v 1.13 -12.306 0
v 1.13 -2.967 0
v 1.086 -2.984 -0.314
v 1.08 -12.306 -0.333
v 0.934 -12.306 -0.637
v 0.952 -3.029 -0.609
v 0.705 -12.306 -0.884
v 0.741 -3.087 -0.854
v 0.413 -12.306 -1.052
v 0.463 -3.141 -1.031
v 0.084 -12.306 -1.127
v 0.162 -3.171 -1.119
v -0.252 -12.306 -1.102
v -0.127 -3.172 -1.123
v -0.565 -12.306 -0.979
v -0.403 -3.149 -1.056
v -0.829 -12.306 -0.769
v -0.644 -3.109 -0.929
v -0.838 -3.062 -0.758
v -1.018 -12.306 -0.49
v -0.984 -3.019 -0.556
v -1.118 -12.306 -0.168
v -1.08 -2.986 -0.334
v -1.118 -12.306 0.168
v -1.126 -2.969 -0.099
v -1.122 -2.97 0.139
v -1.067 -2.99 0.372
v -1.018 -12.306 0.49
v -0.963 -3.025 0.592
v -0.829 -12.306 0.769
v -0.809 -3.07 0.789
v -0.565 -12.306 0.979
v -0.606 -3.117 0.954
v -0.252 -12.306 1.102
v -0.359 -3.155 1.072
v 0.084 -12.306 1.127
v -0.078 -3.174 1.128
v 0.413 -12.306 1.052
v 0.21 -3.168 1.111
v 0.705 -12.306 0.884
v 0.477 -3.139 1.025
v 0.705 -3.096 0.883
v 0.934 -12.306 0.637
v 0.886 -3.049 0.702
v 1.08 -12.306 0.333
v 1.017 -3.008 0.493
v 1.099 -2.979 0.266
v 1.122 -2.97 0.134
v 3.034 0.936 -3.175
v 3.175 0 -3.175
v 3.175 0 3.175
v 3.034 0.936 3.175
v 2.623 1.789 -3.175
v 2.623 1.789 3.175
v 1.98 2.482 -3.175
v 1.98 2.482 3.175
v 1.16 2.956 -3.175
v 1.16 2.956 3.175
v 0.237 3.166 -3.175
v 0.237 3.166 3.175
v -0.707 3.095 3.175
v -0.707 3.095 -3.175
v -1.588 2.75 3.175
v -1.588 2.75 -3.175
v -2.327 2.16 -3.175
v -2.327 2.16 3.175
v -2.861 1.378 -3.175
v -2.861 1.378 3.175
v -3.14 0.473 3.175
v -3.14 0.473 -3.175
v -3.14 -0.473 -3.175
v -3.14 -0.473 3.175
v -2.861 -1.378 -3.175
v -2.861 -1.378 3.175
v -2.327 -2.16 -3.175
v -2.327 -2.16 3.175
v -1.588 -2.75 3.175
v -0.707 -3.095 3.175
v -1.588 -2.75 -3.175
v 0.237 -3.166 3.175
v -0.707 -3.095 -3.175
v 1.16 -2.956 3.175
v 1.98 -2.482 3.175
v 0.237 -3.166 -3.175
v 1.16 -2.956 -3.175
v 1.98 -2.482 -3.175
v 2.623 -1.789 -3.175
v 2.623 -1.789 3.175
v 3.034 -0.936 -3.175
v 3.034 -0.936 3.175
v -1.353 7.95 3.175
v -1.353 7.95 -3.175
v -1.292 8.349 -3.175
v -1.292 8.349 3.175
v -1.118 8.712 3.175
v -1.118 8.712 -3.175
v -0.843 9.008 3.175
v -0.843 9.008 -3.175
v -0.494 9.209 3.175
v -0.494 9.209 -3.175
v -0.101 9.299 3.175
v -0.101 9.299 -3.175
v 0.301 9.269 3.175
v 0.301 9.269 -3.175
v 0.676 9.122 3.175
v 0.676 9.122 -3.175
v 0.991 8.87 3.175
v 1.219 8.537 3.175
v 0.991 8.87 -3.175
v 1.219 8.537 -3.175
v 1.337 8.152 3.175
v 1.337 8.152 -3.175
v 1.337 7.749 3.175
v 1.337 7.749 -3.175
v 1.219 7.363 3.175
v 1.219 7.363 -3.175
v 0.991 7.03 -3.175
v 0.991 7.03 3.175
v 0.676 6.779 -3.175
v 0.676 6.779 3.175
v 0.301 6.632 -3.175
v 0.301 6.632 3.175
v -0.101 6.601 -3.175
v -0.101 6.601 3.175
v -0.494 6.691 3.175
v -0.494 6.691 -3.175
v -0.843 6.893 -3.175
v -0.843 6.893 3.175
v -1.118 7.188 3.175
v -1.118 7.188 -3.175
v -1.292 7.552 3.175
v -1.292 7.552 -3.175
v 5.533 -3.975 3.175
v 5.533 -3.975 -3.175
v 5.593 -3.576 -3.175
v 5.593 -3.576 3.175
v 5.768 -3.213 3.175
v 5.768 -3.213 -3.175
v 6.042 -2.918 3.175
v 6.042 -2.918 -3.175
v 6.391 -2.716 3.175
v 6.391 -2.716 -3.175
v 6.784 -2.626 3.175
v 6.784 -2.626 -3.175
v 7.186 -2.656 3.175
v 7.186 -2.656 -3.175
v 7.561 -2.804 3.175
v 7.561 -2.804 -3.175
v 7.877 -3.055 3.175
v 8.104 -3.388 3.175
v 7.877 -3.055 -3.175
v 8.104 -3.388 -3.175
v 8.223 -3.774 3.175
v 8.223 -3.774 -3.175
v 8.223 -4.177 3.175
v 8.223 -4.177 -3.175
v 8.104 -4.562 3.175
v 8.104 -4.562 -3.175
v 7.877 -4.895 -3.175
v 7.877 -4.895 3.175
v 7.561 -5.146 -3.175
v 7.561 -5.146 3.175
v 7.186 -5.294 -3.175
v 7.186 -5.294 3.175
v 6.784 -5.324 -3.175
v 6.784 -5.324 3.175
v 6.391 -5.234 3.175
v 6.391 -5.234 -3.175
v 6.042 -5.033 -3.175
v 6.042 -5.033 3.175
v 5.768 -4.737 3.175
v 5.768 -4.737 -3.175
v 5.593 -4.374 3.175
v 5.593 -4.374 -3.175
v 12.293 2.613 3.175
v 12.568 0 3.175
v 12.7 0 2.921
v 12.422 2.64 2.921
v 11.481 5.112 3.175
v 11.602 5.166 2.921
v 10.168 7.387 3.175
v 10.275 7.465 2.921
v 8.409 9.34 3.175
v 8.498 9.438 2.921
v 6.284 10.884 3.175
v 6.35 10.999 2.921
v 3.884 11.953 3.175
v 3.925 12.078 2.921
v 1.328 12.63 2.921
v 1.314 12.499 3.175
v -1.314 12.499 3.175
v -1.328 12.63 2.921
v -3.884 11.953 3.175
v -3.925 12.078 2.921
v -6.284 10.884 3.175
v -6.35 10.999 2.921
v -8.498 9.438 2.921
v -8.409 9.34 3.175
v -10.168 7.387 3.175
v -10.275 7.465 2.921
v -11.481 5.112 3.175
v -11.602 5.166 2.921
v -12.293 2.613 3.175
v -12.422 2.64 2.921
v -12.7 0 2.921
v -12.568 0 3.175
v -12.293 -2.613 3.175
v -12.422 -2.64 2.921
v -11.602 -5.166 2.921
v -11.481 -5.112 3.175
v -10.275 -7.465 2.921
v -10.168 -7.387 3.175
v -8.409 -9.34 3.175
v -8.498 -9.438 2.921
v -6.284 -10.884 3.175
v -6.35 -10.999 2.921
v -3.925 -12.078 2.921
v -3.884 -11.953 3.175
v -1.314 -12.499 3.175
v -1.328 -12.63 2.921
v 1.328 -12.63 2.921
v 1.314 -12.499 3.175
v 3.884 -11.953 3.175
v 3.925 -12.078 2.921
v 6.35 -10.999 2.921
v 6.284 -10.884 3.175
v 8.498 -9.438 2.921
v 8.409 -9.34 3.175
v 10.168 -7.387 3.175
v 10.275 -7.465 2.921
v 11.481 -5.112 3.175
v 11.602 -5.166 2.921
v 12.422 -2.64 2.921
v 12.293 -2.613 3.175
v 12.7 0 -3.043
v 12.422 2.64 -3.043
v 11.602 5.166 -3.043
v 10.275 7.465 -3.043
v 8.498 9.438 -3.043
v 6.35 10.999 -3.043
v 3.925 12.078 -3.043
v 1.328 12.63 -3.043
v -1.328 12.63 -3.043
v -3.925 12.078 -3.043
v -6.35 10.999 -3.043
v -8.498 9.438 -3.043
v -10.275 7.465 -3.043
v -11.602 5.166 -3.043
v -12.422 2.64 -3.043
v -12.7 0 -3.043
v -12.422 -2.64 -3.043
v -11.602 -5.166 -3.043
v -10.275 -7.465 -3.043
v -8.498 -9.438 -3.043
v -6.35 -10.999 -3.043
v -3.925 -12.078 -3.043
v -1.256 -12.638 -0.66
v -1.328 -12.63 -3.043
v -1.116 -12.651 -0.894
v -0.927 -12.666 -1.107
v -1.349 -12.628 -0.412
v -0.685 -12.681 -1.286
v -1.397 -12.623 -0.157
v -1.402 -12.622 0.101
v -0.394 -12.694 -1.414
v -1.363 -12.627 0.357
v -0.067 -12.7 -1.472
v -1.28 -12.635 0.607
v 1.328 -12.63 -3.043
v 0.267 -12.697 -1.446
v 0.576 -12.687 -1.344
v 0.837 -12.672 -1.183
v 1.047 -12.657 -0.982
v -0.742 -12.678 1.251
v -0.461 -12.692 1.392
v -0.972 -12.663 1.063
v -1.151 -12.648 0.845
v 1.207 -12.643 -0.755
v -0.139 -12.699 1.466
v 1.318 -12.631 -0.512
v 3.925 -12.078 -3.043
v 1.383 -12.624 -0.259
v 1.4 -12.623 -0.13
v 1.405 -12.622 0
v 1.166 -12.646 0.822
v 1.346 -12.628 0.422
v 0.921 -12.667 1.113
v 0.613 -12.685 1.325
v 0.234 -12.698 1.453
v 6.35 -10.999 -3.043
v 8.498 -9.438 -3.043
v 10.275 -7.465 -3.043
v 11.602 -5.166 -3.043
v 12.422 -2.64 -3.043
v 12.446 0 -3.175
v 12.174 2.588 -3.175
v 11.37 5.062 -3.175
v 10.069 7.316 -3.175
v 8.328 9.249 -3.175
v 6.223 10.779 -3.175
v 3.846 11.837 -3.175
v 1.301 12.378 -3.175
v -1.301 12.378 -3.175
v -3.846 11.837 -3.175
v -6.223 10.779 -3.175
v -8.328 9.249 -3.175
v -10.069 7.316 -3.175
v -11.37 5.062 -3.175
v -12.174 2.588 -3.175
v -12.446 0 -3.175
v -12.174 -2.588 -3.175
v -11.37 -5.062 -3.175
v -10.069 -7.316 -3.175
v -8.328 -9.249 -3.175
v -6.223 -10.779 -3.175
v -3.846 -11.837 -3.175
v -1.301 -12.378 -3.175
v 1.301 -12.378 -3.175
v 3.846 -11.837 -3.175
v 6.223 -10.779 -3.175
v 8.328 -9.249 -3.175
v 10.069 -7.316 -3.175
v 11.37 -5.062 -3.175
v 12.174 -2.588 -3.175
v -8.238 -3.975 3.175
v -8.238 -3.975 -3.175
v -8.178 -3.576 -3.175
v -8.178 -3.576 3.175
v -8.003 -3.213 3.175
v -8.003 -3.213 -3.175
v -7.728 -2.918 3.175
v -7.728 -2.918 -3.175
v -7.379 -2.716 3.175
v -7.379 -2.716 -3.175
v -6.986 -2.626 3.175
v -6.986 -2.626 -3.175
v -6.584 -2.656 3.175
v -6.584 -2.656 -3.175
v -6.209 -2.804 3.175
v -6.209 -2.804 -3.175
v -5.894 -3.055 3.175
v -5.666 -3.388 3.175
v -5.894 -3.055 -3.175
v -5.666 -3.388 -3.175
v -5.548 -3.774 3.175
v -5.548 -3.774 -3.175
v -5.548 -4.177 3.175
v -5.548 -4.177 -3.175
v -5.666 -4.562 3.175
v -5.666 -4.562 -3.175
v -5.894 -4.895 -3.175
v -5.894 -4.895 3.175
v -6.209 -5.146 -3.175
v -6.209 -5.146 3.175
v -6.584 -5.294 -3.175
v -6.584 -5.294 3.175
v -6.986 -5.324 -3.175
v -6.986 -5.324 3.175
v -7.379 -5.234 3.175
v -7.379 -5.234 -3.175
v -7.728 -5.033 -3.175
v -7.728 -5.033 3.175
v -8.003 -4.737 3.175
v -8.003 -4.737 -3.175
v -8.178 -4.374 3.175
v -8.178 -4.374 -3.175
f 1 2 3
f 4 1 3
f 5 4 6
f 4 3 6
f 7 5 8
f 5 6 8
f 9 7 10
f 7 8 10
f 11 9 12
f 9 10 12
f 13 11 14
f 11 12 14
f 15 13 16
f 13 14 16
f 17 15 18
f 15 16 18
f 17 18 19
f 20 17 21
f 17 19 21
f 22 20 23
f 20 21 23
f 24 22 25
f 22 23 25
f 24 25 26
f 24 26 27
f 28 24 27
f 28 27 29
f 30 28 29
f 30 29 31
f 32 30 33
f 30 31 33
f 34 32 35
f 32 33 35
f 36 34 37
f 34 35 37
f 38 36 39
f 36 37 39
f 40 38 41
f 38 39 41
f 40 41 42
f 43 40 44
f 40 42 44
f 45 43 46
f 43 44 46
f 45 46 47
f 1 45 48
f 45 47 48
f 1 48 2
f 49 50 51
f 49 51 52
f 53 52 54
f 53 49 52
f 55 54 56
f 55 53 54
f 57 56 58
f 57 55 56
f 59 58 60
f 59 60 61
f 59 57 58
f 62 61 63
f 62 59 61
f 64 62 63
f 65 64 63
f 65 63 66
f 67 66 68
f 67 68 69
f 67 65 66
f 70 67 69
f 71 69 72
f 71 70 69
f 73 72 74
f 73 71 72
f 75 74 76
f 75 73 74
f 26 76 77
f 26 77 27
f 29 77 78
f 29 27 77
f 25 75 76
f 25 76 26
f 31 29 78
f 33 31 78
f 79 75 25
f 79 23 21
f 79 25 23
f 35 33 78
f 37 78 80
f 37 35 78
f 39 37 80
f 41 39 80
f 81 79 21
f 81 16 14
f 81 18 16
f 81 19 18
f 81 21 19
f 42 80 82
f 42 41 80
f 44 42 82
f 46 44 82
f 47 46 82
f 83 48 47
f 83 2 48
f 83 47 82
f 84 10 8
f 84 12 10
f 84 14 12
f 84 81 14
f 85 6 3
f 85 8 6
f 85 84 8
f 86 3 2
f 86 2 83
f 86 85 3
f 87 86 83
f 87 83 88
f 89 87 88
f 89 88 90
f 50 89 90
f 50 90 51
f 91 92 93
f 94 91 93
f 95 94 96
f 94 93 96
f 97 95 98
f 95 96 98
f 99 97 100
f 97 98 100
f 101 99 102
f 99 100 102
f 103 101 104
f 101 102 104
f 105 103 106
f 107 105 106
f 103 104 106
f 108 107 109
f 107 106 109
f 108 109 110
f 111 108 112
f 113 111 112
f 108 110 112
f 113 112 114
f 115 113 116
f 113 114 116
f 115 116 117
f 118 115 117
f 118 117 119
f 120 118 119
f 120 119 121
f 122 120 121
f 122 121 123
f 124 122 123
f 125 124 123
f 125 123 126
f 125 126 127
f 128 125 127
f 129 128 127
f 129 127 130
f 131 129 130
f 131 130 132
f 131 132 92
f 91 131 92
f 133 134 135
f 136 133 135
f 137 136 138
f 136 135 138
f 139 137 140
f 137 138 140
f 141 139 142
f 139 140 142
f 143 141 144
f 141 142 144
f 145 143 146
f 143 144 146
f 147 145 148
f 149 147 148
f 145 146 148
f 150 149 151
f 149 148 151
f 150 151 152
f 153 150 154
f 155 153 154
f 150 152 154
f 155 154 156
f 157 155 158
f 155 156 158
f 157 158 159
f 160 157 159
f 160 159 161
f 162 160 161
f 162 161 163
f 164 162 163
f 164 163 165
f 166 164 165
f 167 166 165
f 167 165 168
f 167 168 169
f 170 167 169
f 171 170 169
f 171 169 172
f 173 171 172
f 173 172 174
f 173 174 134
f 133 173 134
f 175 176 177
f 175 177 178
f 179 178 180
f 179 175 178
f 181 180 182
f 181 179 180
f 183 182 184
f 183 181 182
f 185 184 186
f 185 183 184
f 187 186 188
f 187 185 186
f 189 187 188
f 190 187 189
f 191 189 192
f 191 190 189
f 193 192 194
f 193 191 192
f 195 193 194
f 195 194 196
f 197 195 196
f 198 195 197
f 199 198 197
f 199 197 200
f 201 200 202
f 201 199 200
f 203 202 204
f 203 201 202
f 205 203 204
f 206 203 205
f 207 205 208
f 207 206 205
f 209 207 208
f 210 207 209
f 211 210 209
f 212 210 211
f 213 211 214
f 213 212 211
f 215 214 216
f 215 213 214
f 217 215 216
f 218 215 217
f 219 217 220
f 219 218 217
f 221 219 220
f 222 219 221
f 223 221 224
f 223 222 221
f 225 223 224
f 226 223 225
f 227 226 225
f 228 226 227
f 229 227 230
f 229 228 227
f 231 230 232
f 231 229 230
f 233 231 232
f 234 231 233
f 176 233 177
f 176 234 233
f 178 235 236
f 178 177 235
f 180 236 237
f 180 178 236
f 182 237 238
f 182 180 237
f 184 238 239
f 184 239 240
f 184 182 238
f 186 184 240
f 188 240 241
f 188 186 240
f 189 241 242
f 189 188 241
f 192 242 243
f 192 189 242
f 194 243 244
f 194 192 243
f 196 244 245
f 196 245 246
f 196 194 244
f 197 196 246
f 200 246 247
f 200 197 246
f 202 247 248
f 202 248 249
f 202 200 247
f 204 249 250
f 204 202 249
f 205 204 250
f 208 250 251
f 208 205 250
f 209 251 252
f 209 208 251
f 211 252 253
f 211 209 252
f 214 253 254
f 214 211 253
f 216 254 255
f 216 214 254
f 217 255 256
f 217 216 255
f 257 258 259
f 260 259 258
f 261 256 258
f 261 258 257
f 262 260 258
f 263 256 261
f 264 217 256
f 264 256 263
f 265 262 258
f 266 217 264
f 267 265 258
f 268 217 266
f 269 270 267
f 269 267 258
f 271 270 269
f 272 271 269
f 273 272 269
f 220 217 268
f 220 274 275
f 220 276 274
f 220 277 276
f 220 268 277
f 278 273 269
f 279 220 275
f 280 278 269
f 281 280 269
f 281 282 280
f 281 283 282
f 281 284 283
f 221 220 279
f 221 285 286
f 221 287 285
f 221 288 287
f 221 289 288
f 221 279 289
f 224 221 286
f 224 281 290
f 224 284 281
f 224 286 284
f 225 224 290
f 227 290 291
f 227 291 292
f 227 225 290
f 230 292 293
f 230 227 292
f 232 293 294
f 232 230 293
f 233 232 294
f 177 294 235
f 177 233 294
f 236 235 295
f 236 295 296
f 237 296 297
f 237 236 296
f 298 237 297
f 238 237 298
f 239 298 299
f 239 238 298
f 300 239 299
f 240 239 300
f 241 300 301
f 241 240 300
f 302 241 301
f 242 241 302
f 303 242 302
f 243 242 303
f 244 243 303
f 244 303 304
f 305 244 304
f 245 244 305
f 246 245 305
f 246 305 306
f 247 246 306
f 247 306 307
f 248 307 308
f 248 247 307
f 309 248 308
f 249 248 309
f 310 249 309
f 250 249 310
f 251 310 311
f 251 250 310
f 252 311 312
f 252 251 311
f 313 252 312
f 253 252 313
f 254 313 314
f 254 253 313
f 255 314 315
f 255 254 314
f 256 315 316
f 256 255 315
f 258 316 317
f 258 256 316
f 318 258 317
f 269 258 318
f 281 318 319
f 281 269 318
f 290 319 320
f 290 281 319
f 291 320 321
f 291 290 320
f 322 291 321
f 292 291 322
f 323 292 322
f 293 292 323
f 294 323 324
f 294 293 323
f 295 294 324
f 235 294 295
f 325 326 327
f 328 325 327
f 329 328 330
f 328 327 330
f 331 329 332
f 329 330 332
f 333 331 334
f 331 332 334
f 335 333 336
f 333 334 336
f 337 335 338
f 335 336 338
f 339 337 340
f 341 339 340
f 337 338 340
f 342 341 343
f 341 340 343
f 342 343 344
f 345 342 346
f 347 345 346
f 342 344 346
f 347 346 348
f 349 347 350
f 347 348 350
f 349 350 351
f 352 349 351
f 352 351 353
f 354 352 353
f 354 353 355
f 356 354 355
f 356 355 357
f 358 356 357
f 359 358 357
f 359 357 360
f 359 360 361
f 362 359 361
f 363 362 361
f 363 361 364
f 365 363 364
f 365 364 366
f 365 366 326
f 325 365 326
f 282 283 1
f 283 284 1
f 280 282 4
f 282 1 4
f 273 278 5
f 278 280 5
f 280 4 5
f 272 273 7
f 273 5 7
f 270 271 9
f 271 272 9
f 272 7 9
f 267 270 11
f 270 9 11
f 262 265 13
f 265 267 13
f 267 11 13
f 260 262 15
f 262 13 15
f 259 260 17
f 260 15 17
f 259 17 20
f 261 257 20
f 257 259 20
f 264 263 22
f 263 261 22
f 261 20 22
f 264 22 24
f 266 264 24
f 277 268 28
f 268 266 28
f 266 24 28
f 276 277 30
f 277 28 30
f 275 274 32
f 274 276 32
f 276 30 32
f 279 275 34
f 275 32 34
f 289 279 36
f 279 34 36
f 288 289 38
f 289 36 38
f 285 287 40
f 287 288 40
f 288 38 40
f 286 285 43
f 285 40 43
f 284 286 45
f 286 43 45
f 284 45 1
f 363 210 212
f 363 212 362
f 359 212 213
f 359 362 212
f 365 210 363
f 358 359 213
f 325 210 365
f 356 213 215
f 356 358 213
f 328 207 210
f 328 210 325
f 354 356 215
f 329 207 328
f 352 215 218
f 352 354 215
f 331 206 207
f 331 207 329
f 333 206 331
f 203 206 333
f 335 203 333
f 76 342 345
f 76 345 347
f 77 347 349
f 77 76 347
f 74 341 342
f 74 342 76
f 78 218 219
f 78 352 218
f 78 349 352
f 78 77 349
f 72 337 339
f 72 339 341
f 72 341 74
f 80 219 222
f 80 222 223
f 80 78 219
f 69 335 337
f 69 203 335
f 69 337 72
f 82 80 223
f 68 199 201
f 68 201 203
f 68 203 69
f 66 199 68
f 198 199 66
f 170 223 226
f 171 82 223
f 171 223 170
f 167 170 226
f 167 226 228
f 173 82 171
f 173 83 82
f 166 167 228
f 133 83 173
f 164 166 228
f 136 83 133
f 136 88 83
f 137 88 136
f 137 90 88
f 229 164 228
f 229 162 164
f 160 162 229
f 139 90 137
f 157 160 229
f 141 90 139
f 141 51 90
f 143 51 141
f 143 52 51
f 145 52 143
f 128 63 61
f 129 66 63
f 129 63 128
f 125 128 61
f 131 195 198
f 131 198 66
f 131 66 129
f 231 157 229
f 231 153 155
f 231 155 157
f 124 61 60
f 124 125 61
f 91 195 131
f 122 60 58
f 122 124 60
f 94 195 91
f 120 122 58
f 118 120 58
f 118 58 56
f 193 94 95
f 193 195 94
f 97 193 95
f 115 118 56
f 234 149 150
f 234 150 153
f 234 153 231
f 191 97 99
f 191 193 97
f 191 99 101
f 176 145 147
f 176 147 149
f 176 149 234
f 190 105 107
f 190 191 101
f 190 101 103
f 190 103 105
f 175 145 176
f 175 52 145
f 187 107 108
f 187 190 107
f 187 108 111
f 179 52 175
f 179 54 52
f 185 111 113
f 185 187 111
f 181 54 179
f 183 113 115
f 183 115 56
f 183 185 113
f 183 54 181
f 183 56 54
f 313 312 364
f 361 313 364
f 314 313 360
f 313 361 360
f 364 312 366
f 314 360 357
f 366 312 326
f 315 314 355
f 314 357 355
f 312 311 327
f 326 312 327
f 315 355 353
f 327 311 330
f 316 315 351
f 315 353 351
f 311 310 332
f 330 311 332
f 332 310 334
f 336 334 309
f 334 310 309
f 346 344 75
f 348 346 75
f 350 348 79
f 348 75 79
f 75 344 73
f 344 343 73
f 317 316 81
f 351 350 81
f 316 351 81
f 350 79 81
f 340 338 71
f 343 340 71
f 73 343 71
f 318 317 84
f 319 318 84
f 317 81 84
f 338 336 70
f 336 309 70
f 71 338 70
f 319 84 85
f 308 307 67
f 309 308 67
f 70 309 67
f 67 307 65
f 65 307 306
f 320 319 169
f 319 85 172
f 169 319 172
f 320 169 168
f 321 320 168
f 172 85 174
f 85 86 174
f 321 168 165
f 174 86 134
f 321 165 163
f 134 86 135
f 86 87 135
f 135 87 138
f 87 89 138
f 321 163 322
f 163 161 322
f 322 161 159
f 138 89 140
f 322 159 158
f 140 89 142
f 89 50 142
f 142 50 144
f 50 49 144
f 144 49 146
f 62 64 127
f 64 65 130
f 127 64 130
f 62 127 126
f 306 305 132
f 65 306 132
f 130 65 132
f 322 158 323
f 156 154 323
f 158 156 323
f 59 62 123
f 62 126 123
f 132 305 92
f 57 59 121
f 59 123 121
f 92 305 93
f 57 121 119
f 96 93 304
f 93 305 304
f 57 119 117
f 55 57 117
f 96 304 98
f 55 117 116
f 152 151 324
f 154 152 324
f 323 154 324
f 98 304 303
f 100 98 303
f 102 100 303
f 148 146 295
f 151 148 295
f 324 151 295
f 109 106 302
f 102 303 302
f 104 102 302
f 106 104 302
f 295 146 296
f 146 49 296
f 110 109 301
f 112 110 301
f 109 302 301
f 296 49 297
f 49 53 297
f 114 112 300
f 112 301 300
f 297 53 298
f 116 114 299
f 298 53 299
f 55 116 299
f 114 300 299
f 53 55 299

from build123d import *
from OCP.BRepFilletAPI import BRepFilletAPI_MakeChamfer

# Parameters (mm, degrees)
SKETCH2_R             = 12.7
SKETCH2_R_2           = 3.175
BOSS_EXTRUDE1_DEPTH   = 3.175
CHAMFER1_SIZE         = 0.254
CHAMFER1_SIZE2        = 0.132224031
F_6_32_TAPPED_HOLE1_D = 2.7051


# Read off the part's stored shape, not the designer's step: #4-40 Tapped Hole2
with BuildPart() as part:
    # Sketch2 → Boss-Extrude1 (new, symmetric)
    with BuildSketch(Plane.XY):
        Circle(SKETCH2_R)
        Circle(SKETCH2_R_2, mode=Mode.SUBTRACT)
    extrude(amount=BOSS_EXTRUDE1_DEPTH, both=True)

    # Chamfer1: one chamfer whose edges measure the first distance from different faces: ONE call of the kernel's chamfer builder (chamfer() names one face for all edges)
    chamfer1_edges_1 = [part.edges().sort_by_distance(p)[0] for p in [
        (-12.7, 0, -3.175),
    ]]
    chamfer1_side_1 = [part.faces().sort_by_distance(p)[0] for p in [
        (-12.340789755, 0, -3.175),
    ]]
    chamfer1_edges_2 = [part.edges().sort_by_distance(p)[0] for p in [
        (-12.7, 0, 3.175),
    ]]
    chamfer1_side_2 = [part.faces().sort_by_distance(p)[0] for p in [
        (-12.7, 0, 0),
    ]]
    chamfer1 = BRepFilletAPI_MakeChamfer(part.part.solid().wrapped)
    for e in chamfer1_edges_1:
        chamfer1.Add(CHAMFER1_SIZE, CHAMFER1_SIZE2, e.wrapped, chamfer1_side_1[0].wrapped)  # the first distance lies on this face
    for e in chamfer1_edges_2:
        chamfer1.Add(CHAMFER1_SIZE, CHAMFER1_SIZE2, e.wrapped, chamfer1_side_2[0].wrapped)  # the first distance lies on this face
    add(Compound.cast(chamfer1.Shape()), mode=Mode.REPLACE)

    # #6-32 Tapped Hole1 (through all)
    with Locations(Plane.XY.offset(3.175)):
        with Locations((0, 7.9502), (6.885075165, -3.9751), (-6.885075165, -3.9751)):
            Hole(F_6_32_TAPPED_HOLE1_D / 2)

    # #4-40 Tapped Hole2 outline → #4-40 Tapped Hole2 (revolve, cut)
    with BuildSketch(Plane.XY):
        Polygon((0, -12.700018831), (1.473216369, -12.700018831), (1.1303, -12.305538673), (1.1303, -2.966966147), (0, -2.966966147), align=None)
    revolve(axis=Axis((0, 0, 0), (0, 1, 0)), mode=Mode.SUBTRACT)


solid = part.part
